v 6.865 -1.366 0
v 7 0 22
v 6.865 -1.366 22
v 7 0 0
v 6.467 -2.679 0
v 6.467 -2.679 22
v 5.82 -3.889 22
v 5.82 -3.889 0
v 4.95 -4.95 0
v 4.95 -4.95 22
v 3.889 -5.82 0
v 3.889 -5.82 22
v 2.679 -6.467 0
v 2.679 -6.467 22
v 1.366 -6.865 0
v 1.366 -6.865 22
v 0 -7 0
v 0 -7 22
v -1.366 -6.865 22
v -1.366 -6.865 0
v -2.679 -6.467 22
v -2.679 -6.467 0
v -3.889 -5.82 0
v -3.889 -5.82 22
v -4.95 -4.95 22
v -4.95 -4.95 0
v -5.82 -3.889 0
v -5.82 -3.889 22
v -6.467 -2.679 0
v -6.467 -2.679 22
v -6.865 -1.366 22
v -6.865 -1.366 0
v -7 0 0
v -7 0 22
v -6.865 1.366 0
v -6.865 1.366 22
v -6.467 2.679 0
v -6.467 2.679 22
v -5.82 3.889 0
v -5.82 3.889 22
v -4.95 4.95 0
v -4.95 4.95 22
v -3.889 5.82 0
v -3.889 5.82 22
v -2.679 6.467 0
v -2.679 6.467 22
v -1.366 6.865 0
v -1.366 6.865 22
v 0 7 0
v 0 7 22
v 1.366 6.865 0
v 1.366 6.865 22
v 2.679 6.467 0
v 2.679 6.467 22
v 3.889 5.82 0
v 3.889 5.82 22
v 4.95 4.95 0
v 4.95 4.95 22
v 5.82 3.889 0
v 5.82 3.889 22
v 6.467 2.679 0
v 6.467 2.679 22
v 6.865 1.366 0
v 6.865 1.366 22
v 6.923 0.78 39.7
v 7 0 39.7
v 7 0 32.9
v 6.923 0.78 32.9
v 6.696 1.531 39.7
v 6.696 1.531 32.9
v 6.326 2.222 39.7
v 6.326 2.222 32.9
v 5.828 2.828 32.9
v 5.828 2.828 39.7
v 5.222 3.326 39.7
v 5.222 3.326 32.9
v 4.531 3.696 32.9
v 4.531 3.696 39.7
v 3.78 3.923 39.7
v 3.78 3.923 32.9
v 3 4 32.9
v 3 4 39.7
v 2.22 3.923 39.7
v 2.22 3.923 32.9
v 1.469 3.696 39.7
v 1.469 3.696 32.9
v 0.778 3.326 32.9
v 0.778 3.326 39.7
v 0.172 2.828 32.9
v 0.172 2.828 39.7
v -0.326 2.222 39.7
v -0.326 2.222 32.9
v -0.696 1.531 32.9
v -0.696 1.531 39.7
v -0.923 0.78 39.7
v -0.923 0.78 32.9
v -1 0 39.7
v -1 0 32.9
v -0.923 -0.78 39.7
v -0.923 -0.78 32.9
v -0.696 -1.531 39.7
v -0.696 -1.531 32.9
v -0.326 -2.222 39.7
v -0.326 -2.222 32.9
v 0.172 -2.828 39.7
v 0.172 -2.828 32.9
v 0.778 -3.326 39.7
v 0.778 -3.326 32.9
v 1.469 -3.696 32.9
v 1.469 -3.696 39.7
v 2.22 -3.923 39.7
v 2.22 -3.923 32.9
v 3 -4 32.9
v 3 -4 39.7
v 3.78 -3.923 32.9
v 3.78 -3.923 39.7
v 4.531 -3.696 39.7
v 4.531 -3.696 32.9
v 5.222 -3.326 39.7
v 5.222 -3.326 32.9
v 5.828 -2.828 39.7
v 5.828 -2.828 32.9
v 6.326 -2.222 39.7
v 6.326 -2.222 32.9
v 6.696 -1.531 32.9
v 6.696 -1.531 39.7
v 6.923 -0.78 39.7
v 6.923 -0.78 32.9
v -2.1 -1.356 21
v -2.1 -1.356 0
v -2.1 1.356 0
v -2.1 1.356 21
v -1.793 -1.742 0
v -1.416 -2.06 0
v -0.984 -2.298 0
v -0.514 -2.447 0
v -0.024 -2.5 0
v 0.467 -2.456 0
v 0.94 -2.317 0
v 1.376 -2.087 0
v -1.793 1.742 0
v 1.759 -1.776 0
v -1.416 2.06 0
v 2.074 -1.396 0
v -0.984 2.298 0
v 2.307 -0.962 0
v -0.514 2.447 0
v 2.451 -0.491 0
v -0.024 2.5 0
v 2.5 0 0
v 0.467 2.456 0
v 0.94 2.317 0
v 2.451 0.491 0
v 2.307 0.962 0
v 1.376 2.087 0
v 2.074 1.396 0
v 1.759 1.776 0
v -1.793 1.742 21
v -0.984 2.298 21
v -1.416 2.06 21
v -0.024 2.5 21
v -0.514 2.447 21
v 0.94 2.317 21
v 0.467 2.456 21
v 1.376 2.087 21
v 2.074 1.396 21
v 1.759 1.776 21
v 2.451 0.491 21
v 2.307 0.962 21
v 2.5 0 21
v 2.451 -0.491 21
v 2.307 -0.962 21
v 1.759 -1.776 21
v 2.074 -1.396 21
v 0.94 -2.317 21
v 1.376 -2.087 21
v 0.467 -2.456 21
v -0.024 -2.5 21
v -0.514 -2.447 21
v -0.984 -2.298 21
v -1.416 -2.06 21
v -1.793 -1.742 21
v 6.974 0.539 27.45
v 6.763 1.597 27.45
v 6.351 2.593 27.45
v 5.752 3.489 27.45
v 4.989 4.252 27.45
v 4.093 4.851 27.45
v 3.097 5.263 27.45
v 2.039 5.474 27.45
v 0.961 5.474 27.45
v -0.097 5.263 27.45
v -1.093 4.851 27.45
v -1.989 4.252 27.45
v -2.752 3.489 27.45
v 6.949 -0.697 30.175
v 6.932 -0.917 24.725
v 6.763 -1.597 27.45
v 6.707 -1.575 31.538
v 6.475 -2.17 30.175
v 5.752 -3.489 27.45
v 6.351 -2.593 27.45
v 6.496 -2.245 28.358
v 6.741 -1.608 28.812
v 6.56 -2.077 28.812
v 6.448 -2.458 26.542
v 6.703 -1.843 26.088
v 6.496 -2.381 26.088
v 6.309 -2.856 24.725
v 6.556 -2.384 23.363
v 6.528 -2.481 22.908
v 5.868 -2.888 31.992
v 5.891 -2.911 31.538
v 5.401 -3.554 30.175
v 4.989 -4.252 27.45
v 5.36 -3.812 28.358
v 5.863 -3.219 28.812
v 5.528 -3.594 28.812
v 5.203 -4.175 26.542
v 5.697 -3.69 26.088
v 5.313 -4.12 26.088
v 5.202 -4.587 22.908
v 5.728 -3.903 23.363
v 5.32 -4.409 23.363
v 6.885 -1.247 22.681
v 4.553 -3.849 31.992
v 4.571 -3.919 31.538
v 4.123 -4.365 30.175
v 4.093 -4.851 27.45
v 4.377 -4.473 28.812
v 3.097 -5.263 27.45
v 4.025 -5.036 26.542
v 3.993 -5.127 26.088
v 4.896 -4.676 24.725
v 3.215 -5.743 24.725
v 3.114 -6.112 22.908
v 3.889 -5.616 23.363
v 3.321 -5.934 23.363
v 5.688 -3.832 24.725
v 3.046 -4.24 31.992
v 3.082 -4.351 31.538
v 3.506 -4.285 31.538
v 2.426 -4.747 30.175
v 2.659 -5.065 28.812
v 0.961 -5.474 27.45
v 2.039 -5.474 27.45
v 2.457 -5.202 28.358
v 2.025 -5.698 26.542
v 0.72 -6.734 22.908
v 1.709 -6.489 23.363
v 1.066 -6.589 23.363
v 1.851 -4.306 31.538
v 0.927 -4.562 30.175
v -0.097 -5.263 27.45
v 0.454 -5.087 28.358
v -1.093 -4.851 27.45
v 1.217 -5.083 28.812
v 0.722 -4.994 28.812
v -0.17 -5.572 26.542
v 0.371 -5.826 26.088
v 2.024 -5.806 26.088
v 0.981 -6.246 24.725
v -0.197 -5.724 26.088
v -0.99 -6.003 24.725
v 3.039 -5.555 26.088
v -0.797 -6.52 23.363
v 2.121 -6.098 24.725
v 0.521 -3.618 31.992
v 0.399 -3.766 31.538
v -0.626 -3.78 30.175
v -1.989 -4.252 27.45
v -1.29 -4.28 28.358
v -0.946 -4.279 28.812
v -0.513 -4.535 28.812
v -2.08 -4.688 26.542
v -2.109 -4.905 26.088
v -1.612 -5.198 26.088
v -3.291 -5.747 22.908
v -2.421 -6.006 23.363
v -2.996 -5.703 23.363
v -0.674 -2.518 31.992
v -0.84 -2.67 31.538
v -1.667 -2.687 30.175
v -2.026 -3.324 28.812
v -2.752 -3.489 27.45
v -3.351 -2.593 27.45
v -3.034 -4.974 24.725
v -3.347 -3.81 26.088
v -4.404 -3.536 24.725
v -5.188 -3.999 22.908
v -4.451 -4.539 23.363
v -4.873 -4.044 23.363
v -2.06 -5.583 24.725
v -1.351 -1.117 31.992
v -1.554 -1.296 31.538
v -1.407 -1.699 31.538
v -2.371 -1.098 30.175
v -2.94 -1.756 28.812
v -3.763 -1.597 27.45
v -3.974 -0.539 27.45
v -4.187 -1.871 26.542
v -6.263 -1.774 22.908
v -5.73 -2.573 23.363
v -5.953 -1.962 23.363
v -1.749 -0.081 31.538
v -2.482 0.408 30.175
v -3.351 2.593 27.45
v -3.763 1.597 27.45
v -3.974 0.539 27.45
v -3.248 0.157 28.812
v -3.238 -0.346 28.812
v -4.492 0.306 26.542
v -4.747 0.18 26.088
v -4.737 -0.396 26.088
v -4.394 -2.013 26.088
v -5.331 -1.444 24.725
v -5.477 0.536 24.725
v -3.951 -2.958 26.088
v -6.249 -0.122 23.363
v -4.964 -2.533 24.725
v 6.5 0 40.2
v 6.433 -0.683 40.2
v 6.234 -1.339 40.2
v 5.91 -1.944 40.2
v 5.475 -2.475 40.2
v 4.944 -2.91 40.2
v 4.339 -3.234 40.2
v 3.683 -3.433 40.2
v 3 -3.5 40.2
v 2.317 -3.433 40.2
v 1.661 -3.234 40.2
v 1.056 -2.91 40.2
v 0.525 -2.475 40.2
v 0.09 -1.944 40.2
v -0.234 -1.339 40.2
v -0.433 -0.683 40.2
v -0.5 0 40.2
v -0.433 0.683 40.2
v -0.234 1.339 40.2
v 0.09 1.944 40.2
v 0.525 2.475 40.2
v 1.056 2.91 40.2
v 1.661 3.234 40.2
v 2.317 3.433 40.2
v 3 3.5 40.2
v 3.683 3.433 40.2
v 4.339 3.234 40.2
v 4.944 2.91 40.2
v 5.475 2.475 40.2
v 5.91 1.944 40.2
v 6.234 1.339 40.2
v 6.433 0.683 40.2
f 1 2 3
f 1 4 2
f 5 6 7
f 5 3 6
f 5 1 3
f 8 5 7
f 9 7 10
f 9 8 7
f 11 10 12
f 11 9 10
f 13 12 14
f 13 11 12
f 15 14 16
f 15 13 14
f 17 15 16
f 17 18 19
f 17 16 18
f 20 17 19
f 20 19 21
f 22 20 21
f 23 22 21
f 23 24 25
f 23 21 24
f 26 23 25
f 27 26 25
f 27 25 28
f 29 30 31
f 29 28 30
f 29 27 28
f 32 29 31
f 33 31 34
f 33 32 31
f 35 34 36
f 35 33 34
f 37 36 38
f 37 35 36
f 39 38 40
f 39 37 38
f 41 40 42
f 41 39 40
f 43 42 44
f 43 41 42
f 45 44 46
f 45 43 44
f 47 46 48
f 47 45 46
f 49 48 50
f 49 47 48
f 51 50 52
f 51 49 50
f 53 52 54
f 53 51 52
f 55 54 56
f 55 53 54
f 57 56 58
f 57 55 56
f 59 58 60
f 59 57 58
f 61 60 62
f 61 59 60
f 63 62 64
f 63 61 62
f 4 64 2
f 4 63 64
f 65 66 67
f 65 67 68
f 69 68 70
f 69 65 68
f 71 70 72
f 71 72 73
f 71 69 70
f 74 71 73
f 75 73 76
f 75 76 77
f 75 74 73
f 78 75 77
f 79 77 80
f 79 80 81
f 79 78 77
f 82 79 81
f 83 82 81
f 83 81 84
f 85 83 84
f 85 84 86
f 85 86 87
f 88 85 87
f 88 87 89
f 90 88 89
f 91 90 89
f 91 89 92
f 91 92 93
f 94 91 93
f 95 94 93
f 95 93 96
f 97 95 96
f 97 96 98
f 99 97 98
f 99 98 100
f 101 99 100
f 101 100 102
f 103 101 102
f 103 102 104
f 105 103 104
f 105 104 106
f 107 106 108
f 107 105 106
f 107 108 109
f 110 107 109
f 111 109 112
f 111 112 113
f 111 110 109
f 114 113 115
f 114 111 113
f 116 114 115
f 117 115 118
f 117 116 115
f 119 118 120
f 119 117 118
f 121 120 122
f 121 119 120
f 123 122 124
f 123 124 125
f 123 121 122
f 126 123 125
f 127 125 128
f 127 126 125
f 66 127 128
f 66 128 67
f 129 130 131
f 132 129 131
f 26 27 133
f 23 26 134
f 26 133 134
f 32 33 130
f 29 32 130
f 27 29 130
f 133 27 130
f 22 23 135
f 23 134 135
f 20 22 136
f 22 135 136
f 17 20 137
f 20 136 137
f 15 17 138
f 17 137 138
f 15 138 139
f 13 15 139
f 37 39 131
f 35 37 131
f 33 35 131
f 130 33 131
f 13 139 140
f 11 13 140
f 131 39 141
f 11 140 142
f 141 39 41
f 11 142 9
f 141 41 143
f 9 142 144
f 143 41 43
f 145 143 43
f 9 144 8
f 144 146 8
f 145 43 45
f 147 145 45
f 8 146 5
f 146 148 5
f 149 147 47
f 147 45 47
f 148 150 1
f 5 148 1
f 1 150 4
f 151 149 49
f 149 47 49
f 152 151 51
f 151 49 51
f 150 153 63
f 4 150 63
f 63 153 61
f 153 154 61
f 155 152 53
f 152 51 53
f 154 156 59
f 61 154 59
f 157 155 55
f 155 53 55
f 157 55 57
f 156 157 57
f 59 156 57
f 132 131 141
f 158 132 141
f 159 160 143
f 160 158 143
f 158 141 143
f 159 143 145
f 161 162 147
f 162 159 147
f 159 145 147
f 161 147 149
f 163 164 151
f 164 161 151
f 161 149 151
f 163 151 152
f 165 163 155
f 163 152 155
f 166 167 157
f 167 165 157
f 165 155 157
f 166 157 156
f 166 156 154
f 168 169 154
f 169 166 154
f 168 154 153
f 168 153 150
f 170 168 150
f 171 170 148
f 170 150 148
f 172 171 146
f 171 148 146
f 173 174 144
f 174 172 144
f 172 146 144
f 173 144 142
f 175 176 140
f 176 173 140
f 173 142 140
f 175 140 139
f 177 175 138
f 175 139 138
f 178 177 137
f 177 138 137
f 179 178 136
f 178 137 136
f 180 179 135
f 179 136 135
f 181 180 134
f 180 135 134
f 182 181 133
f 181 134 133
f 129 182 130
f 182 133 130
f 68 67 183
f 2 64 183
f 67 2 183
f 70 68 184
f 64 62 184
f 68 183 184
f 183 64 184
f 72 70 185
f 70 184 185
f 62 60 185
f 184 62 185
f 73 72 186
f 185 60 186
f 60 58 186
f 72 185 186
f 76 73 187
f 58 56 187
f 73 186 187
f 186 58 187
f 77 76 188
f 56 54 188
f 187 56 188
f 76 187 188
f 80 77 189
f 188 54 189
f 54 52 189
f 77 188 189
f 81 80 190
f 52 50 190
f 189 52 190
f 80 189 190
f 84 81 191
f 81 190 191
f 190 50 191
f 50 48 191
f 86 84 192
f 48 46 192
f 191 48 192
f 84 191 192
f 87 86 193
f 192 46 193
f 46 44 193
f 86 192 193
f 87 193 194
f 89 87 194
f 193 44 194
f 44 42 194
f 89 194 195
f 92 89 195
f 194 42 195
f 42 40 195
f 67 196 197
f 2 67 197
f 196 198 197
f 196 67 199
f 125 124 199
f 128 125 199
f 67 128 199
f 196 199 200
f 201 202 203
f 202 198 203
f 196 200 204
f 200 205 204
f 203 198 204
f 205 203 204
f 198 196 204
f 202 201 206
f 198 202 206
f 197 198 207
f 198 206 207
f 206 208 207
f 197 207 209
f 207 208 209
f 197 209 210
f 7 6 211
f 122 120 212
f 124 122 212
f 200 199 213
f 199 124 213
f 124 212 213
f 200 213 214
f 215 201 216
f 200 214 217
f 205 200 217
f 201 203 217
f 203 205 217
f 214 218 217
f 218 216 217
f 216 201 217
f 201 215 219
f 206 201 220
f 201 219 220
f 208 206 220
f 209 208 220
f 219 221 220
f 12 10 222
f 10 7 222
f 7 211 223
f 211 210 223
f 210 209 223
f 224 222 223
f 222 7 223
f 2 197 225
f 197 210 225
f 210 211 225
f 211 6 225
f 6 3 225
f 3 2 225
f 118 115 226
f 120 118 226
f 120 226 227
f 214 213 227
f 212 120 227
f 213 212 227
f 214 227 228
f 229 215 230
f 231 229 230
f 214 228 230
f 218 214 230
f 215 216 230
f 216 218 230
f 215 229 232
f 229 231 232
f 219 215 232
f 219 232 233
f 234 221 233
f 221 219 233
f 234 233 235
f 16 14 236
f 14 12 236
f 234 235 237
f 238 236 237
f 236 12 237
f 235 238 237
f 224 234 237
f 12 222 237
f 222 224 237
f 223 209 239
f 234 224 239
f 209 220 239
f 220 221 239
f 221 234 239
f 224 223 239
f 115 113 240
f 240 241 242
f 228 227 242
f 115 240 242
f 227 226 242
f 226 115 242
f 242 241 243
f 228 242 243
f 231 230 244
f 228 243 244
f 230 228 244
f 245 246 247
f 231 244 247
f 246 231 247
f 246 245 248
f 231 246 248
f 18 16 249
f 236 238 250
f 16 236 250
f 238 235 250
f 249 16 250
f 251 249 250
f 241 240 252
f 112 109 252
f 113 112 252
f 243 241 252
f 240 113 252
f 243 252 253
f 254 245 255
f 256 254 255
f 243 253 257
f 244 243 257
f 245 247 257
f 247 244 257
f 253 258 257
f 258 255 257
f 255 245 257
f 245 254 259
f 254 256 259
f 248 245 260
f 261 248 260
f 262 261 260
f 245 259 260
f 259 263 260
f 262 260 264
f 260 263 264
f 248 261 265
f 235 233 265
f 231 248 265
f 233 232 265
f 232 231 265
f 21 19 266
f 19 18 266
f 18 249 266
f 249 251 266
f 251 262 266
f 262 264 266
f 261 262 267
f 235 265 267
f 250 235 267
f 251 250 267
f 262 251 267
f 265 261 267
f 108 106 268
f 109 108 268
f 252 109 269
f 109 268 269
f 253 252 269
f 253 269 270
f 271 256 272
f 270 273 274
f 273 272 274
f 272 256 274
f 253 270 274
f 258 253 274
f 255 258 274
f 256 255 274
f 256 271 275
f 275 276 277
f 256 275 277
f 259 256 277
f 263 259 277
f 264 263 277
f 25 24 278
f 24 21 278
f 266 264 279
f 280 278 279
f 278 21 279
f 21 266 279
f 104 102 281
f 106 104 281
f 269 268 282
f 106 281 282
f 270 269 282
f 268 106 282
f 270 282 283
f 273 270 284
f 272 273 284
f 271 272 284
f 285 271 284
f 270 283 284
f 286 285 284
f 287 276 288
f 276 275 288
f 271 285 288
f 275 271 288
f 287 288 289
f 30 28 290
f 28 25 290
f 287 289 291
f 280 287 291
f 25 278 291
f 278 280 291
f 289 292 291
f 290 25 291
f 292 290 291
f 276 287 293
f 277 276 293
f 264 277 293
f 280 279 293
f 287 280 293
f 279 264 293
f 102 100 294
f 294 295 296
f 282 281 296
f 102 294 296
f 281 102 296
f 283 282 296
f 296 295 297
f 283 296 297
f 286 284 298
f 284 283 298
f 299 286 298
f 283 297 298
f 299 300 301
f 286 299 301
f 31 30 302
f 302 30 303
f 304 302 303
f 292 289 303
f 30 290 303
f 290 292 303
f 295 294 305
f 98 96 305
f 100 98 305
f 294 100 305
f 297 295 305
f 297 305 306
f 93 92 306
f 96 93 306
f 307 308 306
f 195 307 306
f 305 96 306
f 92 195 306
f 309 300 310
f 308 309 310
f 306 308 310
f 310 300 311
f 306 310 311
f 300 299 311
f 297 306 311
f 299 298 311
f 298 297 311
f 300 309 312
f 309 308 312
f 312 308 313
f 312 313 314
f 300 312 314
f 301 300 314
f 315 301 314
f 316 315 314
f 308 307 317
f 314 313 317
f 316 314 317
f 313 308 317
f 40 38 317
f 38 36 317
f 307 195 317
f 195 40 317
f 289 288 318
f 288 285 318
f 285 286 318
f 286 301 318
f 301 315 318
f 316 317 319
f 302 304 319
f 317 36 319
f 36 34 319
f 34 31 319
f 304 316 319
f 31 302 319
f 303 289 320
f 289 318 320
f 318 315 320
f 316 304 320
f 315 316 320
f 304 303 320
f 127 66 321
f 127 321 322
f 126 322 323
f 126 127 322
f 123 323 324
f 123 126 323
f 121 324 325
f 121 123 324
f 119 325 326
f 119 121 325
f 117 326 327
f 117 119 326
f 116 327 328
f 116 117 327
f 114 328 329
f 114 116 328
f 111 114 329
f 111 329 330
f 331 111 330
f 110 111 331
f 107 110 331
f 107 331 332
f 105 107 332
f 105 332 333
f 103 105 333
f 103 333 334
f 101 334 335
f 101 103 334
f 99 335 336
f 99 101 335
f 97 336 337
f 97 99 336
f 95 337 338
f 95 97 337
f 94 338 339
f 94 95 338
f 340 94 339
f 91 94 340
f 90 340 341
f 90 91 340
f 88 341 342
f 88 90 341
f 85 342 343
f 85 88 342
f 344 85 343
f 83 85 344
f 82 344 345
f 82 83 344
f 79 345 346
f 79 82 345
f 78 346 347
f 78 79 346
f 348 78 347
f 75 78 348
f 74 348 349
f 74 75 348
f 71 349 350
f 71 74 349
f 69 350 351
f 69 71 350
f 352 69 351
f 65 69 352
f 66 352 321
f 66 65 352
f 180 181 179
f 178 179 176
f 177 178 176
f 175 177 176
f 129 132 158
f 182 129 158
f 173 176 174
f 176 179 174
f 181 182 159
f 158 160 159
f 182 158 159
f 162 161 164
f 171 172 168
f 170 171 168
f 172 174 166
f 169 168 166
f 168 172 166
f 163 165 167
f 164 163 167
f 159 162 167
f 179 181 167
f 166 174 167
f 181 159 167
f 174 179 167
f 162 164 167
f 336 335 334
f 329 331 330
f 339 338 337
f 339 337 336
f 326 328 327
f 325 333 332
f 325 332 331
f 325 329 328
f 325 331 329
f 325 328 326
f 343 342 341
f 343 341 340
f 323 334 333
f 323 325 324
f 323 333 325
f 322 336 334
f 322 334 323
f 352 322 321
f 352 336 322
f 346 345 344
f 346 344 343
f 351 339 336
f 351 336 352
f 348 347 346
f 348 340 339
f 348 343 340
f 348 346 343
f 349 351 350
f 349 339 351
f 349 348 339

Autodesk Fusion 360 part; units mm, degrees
sketch "Sketch1" plane through (0, 0, 0) normal (0, 0, 1) x (1, 0, 0)
  circle A0 centre (0, 0) radius 7
  line L0 (-2.1, -1.3565) -> (-2.1, 1.3565)
  arc A1 (-2.1, -1.3565) -> (-2.1, 1.3565) centre (0, 0) ccw
  dimension "d1" = 14
  dimension "d8" = 5
  dimension "d9" = 2.1
extrude "Extrude1" add sketch "Sketch1" along normal blind 22 contours A0 | L0 A1 makes body 1
ref_plane "WorkPlane1" through (0, 0, 40.2) normal (0, 0, 1) x (1, 0, 0)
sketch "Sketch2" plane through (0, 0, 40.2) normal (0, 0, 1) x (1, 0, 0)
  circle A0 centre (0, 0) radius 7
  circle A1 centre (3, 0) radius 4
  dimension "d5" = 8
extrude "Extrude2" add sketch "Sketch2" against normal blind 7.3 separate body contours A1 makes body 2
loft "Loft1" add section 1 face at (3.1171, 1.096, 32.9) section 2 face at (1.11, -1.8763, 22) on bodies 1 2 bodies 1 2
extrude "Extrude3" cut sketch "Sketch1" along normal blind 21 contours L0 A1 bodies 1
chamfer "Chamfer1" distance 0.5 angle 45 1 edges at (-0.7293, -1.4465, 40.2) on bodies 1 2
